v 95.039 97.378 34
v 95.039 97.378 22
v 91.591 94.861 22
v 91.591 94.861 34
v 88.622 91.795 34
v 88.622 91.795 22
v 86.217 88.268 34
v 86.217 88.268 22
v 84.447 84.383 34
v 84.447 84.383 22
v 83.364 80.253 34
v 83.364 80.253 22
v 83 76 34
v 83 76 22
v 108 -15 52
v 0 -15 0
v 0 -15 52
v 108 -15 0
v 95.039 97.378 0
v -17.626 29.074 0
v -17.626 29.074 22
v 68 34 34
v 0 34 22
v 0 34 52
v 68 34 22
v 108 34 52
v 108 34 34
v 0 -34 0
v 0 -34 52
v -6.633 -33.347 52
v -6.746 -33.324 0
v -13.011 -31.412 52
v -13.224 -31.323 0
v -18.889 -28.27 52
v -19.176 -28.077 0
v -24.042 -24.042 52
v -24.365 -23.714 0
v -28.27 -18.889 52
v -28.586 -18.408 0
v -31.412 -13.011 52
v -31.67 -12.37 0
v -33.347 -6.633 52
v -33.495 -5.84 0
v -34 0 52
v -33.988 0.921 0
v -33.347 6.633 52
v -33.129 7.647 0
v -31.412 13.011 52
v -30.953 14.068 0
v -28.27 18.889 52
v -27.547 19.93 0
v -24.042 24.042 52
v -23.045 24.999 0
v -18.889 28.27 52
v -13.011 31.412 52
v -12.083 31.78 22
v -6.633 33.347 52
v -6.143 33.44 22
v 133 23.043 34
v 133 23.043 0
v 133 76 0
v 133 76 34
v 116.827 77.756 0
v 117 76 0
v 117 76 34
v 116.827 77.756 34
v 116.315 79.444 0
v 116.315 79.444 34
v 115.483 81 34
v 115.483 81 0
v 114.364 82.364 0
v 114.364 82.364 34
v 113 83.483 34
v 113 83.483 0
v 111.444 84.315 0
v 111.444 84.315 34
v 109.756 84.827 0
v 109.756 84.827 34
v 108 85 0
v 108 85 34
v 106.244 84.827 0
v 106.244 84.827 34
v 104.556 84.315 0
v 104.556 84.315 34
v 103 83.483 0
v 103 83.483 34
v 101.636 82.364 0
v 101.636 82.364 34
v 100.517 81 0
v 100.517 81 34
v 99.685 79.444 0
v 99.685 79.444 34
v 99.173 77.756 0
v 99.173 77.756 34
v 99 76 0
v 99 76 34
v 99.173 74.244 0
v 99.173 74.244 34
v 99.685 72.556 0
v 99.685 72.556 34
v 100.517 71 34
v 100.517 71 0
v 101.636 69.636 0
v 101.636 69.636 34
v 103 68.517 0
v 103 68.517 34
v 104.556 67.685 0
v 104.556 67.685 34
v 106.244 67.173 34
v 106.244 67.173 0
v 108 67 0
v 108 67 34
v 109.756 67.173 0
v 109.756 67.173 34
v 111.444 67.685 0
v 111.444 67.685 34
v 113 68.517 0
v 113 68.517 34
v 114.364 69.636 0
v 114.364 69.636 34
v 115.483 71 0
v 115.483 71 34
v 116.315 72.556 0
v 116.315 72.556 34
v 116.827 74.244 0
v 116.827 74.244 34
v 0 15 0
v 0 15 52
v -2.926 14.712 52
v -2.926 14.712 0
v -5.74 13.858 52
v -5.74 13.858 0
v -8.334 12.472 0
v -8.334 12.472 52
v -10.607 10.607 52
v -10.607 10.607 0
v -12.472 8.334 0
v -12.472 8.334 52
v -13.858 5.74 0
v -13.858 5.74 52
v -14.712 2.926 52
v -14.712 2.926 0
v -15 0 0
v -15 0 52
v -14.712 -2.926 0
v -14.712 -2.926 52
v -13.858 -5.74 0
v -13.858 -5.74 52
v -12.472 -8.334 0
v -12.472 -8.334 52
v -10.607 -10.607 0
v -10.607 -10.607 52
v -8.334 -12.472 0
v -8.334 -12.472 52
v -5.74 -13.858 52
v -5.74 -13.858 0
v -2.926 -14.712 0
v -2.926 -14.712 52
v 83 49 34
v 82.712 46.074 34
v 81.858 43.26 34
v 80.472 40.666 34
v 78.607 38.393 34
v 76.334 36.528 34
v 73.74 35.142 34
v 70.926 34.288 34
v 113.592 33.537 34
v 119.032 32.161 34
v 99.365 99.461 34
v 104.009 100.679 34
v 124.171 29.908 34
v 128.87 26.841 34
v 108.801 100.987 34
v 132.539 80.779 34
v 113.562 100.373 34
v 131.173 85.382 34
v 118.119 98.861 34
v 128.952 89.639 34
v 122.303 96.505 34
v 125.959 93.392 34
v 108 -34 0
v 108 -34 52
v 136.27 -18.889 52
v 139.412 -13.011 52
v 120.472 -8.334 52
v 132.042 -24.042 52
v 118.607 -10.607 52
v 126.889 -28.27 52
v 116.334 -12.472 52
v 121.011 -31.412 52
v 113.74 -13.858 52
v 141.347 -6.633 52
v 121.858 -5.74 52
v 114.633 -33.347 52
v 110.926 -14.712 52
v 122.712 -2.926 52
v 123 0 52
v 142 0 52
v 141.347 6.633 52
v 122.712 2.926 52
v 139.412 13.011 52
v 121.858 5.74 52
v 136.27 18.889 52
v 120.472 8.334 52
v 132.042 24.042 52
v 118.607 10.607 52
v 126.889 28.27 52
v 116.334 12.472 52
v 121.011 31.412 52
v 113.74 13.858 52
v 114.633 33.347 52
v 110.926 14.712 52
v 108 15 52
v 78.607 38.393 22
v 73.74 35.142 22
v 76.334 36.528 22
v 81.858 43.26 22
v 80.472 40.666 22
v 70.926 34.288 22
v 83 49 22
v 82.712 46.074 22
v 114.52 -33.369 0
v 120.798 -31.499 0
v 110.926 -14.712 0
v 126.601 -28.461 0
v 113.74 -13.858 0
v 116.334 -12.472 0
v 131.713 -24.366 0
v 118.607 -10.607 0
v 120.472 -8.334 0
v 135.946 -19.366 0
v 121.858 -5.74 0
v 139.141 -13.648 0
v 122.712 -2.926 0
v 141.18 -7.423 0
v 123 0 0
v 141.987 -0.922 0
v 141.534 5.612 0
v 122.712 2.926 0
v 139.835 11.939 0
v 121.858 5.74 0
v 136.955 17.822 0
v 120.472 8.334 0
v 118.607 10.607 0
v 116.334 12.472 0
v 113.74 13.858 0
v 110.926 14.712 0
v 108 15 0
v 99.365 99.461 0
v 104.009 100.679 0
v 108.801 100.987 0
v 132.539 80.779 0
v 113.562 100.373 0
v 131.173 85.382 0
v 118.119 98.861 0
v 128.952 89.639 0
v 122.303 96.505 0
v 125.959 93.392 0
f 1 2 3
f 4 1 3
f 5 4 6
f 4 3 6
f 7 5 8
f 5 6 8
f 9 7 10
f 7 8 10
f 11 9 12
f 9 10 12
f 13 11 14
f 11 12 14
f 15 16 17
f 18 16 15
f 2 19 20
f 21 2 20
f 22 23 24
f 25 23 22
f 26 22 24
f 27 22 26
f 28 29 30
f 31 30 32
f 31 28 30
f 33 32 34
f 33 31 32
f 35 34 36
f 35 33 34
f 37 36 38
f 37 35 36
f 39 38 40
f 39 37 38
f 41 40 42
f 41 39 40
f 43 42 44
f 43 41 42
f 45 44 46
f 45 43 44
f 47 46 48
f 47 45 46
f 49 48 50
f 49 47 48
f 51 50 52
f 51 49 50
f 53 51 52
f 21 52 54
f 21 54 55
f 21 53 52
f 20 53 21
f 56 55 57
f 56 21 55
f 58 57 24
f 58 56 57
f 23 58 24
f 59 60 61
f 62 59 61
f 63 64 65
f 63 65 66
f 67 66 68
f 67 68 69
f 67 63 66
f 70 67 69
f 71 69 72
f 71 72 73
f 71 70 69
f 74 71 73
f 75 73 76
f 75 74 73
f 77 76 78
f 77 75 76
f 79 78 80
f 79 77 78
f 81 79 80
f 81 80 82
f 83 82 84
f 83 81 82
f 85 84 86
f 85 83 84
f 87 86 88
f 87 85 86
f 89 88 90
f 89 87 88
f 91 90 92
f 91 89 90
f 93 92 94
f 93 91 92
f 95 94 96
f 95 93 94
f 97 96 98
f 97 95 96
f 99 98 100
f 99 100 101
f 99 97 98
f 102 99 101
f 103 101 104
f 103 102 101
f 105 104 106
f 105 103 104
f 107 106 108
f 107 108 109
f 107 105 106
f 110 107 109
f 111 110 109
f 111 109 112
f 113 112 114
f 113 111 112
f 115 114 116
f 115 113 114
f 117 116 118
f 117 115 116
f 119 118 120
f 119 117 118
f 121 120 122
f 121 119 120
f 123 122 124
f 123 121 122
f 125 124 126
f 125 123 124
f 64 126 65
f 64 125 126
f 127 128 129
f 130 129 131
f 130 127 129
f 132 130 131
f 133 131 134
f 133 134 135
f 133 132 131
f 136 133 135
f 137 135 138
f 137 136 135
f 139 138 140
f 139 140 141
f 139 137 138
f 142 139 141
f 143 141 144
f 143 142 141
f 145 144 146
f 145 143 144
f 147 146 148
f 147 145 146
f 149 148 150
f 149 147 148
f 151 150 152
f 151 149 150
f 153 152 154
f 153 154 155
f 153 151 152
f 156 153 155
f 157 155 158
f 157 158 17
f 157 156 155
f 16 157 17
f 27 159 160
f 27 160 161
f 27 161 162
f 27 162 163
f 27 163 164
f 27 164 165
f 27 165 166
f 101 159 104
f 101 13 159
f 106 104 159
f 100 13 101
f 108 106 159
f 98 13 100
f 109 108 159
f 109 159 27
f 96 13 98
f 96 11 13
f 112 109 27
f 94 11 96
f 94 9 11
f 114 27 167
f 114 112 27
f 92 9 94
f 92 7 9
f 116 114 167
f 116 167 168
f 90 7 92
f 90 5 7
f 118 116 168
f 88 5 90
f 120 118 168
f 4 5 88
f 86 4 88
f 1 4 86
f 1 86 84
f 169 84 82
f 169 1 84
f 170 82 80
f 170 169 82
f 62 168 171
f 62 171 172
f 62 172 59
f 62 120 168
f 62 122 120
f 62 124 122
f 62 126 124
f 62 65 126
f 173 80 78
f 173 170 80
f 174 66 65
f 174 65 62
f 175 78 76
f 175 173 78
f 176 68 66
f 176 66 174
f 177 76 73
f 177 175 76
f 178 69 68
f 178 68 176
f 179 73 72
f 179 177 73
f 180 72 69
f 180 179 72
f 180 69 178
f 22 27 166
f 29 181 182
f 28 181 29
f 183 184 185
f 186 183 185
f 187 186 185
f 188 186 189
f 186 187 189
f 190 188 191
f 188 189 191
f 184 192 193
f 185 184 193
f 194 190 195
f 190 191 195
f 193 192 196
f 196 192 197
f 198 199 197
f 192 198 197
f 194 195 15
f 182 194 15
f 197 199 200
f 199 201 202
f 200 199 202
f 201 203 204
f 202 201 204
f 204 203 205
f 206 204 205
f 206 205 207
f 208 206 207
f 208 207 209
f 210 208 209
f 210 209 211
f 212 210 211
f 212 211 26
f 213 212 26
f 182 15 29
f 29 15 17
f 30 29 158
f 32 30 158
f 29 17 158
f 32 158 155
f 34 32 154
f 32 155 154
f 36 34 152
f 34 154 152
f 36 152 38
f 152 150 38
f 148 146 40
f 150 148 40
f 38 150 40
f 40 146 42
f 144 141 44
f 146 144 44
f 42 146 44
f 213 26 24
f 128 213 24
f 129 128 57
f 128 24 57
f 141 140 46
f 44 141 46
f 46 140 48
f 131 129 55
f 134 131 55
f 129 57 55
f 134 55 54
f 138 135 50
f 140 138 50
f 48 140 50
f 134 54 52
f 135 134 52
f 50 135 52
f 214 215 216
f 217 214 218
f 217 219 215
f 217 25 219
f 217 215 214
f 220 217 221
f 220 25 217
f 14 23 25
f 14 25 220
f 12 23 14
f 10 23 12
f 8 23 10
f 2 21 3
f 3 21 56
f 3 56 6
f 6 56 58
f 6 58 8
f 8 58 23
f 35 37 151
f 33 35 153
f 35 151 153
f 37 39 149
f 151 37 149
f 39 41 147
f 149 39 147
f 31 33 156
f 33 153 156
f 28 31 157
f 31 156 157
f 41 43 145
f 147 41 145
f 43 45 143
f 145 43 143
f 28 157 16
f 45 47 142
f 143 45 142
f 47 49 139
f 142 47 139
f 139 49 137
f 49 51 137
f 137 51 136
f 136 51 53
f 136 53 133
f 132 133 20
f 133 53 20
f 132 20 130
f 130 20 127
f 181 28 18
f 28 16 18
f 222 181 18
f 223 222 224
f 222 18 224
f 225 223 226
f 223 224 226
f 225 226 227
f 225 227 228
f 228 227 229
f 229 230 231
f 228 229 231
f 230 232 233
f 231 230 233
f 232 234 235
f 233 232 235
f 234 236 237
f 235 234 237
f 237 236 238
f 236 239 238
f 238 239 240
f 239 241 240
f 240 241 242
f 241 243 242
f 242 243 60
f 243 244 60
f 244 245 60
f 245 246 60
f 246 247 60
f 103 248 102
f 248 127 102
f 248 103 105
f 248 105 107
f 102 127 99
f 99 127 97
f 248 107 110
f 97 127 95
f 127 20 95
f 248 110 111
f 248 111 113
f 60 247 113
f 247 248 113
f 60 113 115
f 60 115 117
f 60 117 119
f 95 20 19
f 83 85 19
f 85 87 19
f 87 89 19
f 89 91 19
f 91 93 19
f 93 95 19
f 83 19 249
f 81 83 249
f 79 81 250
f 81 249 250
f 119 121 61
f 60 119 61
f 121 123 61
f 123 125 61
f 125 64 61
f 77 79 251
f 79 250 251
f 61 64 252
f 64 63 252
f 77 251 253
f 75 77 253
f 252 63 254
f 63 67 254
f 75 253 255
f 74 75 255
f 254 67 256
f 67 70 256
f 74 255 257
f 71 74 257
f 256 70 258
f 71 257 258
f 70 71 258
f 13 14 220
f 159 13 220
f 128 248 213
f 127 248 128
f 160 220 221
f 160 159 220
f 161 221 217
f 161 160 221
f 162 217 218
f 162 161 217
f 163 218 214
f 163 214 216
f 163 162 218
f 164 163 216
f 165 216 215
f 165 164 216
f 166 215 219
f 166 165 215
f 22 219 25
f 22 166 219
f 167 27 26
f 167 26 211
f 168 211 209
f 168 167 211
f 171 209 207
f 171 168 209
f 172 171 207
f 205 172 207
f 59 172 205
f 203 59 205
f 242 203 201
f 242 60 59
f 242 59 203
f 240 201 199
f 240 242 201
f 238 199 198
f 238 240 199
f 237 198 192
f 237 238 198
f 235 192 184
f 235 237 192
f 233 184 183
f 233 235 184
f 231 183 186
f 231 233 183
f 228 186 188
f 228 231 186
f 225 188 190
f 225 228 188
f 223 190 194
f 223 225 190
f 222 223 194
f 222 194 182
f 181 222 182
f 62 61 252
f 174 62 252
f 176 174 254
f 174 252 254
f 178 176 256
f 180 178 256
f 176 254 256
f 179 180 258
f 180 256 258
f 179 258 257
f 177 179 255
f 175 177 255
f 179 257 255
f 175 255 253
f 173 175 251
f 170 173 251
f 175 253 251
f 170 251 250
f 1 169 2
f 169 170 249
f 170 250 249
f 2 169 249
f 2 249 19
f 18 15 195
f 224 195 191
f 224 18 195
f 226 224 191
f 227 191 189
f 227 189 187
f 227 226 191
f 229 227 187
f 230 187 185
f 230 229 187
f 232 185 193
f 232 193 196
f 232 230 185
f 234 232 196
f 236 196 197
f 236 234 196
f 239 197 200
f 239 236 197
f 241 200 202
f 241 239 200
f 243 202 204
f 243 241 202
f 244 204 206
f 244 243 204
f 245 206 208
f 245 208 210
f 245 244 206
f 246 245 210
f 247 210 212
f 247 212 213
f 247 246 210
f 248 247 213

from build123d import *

# Parameters (mm, degrees)
BOSS_EXTRUDE1_DEPTH = 52
BOSS_EXTRUDE2_DEPTH = 22
SKETCH1_6_R         = 9
BOSS_EXTRUDE3_DEPTH = 34
FILLET1_R           = 15


with BuildPart() as part:
    # Sketch1 → Boss-Extrude1 (new body)
    with BuildSketch(Plane.XY):
        with BuildLine():
            Line((83, 34), (0, 34))
            ThreePointArc((0, 34), (-9.150825608, 32.745417858), (-17.626329898, 29.074258276))
            ThreePointArc((-17.626329898, 29.074258276), (-32.745417858, -9.150825608), (0, -34))
            Line((0, -34), (108, -34))
            ThreePointArc((108, -34), (139.140623519, -13.647767834), (133, 23.043437244))
            ThreePointArc((133, 23.043437244), (121.647767834, 31.140623519), (108, 34))
            Line((108, 34), (83, 34))
        make_face()
        with BuildLine():
            ThreePointArc((0, -15), (-15, 0), (0, 15))
            Line((0, 15), (108, 15))
            ThreePointArc((108, 15), (123, 0), (108, -15))
            Line((108, -15), (0, -15))
        make_face(mode=Mode.SUBTRACT)
    extrude(amount=BOSS_EXTRUDE1_DEPTH)

    # Sketch1<5> → Boss-Extrude2 (add)
    with BuildSketch(Plane.XY):
        with BuildLine():
            ThreePointArc((-17.626329898, 29.074258276), (-9.150825608, 32.745417858), (0, 34))
            Line((0, 34), (83, 34))
            Line((83, 34), (83, 76))
            ThreePointArc((83, 76), (86.216825102, 88.26757072), (95.03946331, 97.378131086))
            Line((95.03946331, 97.378131086), (-17.626329898, 29.074258276))
        make_face()
    extrude(amount=BOSS_EXTRUDE2_DEPTH)

    # Sketch1<6> → Boss-Extrude3 (add)
    with BuildSketch(Plane.XY):
        with BuildLine():
            Line((83, 76), (83, 34))
            Line((83, 34), (108, 34))
            ThreePointArc((108, 34), (121.647767834, 31.140623519), (133, 23.043437244))
            Line((133, 23.043437244), (133, 76))
            ThreePointArc((133, 76), (120.26757072, 97.783174898), (95.03946331, 97.378131086))
            ThreePointArc((95.03946331, 97.378131086), (86.216825102, 88.26757072), (83, 76))
        make_face()
        with Locations((108, 76)):
            Circle(SKETCH1_6_R, mode=Mode.SUBTRACT)
    extrude(amount=BOSS_EXTRUDE3_DEPTH)

    # Fillet1
    fillet1_edges = [part.edges().sort_by_distance(p)[0] for p in [
        (83, 34, 28),
    ]]
    fillet(fillet1_edges, radius=FILLET1_R)


solid = part.part
